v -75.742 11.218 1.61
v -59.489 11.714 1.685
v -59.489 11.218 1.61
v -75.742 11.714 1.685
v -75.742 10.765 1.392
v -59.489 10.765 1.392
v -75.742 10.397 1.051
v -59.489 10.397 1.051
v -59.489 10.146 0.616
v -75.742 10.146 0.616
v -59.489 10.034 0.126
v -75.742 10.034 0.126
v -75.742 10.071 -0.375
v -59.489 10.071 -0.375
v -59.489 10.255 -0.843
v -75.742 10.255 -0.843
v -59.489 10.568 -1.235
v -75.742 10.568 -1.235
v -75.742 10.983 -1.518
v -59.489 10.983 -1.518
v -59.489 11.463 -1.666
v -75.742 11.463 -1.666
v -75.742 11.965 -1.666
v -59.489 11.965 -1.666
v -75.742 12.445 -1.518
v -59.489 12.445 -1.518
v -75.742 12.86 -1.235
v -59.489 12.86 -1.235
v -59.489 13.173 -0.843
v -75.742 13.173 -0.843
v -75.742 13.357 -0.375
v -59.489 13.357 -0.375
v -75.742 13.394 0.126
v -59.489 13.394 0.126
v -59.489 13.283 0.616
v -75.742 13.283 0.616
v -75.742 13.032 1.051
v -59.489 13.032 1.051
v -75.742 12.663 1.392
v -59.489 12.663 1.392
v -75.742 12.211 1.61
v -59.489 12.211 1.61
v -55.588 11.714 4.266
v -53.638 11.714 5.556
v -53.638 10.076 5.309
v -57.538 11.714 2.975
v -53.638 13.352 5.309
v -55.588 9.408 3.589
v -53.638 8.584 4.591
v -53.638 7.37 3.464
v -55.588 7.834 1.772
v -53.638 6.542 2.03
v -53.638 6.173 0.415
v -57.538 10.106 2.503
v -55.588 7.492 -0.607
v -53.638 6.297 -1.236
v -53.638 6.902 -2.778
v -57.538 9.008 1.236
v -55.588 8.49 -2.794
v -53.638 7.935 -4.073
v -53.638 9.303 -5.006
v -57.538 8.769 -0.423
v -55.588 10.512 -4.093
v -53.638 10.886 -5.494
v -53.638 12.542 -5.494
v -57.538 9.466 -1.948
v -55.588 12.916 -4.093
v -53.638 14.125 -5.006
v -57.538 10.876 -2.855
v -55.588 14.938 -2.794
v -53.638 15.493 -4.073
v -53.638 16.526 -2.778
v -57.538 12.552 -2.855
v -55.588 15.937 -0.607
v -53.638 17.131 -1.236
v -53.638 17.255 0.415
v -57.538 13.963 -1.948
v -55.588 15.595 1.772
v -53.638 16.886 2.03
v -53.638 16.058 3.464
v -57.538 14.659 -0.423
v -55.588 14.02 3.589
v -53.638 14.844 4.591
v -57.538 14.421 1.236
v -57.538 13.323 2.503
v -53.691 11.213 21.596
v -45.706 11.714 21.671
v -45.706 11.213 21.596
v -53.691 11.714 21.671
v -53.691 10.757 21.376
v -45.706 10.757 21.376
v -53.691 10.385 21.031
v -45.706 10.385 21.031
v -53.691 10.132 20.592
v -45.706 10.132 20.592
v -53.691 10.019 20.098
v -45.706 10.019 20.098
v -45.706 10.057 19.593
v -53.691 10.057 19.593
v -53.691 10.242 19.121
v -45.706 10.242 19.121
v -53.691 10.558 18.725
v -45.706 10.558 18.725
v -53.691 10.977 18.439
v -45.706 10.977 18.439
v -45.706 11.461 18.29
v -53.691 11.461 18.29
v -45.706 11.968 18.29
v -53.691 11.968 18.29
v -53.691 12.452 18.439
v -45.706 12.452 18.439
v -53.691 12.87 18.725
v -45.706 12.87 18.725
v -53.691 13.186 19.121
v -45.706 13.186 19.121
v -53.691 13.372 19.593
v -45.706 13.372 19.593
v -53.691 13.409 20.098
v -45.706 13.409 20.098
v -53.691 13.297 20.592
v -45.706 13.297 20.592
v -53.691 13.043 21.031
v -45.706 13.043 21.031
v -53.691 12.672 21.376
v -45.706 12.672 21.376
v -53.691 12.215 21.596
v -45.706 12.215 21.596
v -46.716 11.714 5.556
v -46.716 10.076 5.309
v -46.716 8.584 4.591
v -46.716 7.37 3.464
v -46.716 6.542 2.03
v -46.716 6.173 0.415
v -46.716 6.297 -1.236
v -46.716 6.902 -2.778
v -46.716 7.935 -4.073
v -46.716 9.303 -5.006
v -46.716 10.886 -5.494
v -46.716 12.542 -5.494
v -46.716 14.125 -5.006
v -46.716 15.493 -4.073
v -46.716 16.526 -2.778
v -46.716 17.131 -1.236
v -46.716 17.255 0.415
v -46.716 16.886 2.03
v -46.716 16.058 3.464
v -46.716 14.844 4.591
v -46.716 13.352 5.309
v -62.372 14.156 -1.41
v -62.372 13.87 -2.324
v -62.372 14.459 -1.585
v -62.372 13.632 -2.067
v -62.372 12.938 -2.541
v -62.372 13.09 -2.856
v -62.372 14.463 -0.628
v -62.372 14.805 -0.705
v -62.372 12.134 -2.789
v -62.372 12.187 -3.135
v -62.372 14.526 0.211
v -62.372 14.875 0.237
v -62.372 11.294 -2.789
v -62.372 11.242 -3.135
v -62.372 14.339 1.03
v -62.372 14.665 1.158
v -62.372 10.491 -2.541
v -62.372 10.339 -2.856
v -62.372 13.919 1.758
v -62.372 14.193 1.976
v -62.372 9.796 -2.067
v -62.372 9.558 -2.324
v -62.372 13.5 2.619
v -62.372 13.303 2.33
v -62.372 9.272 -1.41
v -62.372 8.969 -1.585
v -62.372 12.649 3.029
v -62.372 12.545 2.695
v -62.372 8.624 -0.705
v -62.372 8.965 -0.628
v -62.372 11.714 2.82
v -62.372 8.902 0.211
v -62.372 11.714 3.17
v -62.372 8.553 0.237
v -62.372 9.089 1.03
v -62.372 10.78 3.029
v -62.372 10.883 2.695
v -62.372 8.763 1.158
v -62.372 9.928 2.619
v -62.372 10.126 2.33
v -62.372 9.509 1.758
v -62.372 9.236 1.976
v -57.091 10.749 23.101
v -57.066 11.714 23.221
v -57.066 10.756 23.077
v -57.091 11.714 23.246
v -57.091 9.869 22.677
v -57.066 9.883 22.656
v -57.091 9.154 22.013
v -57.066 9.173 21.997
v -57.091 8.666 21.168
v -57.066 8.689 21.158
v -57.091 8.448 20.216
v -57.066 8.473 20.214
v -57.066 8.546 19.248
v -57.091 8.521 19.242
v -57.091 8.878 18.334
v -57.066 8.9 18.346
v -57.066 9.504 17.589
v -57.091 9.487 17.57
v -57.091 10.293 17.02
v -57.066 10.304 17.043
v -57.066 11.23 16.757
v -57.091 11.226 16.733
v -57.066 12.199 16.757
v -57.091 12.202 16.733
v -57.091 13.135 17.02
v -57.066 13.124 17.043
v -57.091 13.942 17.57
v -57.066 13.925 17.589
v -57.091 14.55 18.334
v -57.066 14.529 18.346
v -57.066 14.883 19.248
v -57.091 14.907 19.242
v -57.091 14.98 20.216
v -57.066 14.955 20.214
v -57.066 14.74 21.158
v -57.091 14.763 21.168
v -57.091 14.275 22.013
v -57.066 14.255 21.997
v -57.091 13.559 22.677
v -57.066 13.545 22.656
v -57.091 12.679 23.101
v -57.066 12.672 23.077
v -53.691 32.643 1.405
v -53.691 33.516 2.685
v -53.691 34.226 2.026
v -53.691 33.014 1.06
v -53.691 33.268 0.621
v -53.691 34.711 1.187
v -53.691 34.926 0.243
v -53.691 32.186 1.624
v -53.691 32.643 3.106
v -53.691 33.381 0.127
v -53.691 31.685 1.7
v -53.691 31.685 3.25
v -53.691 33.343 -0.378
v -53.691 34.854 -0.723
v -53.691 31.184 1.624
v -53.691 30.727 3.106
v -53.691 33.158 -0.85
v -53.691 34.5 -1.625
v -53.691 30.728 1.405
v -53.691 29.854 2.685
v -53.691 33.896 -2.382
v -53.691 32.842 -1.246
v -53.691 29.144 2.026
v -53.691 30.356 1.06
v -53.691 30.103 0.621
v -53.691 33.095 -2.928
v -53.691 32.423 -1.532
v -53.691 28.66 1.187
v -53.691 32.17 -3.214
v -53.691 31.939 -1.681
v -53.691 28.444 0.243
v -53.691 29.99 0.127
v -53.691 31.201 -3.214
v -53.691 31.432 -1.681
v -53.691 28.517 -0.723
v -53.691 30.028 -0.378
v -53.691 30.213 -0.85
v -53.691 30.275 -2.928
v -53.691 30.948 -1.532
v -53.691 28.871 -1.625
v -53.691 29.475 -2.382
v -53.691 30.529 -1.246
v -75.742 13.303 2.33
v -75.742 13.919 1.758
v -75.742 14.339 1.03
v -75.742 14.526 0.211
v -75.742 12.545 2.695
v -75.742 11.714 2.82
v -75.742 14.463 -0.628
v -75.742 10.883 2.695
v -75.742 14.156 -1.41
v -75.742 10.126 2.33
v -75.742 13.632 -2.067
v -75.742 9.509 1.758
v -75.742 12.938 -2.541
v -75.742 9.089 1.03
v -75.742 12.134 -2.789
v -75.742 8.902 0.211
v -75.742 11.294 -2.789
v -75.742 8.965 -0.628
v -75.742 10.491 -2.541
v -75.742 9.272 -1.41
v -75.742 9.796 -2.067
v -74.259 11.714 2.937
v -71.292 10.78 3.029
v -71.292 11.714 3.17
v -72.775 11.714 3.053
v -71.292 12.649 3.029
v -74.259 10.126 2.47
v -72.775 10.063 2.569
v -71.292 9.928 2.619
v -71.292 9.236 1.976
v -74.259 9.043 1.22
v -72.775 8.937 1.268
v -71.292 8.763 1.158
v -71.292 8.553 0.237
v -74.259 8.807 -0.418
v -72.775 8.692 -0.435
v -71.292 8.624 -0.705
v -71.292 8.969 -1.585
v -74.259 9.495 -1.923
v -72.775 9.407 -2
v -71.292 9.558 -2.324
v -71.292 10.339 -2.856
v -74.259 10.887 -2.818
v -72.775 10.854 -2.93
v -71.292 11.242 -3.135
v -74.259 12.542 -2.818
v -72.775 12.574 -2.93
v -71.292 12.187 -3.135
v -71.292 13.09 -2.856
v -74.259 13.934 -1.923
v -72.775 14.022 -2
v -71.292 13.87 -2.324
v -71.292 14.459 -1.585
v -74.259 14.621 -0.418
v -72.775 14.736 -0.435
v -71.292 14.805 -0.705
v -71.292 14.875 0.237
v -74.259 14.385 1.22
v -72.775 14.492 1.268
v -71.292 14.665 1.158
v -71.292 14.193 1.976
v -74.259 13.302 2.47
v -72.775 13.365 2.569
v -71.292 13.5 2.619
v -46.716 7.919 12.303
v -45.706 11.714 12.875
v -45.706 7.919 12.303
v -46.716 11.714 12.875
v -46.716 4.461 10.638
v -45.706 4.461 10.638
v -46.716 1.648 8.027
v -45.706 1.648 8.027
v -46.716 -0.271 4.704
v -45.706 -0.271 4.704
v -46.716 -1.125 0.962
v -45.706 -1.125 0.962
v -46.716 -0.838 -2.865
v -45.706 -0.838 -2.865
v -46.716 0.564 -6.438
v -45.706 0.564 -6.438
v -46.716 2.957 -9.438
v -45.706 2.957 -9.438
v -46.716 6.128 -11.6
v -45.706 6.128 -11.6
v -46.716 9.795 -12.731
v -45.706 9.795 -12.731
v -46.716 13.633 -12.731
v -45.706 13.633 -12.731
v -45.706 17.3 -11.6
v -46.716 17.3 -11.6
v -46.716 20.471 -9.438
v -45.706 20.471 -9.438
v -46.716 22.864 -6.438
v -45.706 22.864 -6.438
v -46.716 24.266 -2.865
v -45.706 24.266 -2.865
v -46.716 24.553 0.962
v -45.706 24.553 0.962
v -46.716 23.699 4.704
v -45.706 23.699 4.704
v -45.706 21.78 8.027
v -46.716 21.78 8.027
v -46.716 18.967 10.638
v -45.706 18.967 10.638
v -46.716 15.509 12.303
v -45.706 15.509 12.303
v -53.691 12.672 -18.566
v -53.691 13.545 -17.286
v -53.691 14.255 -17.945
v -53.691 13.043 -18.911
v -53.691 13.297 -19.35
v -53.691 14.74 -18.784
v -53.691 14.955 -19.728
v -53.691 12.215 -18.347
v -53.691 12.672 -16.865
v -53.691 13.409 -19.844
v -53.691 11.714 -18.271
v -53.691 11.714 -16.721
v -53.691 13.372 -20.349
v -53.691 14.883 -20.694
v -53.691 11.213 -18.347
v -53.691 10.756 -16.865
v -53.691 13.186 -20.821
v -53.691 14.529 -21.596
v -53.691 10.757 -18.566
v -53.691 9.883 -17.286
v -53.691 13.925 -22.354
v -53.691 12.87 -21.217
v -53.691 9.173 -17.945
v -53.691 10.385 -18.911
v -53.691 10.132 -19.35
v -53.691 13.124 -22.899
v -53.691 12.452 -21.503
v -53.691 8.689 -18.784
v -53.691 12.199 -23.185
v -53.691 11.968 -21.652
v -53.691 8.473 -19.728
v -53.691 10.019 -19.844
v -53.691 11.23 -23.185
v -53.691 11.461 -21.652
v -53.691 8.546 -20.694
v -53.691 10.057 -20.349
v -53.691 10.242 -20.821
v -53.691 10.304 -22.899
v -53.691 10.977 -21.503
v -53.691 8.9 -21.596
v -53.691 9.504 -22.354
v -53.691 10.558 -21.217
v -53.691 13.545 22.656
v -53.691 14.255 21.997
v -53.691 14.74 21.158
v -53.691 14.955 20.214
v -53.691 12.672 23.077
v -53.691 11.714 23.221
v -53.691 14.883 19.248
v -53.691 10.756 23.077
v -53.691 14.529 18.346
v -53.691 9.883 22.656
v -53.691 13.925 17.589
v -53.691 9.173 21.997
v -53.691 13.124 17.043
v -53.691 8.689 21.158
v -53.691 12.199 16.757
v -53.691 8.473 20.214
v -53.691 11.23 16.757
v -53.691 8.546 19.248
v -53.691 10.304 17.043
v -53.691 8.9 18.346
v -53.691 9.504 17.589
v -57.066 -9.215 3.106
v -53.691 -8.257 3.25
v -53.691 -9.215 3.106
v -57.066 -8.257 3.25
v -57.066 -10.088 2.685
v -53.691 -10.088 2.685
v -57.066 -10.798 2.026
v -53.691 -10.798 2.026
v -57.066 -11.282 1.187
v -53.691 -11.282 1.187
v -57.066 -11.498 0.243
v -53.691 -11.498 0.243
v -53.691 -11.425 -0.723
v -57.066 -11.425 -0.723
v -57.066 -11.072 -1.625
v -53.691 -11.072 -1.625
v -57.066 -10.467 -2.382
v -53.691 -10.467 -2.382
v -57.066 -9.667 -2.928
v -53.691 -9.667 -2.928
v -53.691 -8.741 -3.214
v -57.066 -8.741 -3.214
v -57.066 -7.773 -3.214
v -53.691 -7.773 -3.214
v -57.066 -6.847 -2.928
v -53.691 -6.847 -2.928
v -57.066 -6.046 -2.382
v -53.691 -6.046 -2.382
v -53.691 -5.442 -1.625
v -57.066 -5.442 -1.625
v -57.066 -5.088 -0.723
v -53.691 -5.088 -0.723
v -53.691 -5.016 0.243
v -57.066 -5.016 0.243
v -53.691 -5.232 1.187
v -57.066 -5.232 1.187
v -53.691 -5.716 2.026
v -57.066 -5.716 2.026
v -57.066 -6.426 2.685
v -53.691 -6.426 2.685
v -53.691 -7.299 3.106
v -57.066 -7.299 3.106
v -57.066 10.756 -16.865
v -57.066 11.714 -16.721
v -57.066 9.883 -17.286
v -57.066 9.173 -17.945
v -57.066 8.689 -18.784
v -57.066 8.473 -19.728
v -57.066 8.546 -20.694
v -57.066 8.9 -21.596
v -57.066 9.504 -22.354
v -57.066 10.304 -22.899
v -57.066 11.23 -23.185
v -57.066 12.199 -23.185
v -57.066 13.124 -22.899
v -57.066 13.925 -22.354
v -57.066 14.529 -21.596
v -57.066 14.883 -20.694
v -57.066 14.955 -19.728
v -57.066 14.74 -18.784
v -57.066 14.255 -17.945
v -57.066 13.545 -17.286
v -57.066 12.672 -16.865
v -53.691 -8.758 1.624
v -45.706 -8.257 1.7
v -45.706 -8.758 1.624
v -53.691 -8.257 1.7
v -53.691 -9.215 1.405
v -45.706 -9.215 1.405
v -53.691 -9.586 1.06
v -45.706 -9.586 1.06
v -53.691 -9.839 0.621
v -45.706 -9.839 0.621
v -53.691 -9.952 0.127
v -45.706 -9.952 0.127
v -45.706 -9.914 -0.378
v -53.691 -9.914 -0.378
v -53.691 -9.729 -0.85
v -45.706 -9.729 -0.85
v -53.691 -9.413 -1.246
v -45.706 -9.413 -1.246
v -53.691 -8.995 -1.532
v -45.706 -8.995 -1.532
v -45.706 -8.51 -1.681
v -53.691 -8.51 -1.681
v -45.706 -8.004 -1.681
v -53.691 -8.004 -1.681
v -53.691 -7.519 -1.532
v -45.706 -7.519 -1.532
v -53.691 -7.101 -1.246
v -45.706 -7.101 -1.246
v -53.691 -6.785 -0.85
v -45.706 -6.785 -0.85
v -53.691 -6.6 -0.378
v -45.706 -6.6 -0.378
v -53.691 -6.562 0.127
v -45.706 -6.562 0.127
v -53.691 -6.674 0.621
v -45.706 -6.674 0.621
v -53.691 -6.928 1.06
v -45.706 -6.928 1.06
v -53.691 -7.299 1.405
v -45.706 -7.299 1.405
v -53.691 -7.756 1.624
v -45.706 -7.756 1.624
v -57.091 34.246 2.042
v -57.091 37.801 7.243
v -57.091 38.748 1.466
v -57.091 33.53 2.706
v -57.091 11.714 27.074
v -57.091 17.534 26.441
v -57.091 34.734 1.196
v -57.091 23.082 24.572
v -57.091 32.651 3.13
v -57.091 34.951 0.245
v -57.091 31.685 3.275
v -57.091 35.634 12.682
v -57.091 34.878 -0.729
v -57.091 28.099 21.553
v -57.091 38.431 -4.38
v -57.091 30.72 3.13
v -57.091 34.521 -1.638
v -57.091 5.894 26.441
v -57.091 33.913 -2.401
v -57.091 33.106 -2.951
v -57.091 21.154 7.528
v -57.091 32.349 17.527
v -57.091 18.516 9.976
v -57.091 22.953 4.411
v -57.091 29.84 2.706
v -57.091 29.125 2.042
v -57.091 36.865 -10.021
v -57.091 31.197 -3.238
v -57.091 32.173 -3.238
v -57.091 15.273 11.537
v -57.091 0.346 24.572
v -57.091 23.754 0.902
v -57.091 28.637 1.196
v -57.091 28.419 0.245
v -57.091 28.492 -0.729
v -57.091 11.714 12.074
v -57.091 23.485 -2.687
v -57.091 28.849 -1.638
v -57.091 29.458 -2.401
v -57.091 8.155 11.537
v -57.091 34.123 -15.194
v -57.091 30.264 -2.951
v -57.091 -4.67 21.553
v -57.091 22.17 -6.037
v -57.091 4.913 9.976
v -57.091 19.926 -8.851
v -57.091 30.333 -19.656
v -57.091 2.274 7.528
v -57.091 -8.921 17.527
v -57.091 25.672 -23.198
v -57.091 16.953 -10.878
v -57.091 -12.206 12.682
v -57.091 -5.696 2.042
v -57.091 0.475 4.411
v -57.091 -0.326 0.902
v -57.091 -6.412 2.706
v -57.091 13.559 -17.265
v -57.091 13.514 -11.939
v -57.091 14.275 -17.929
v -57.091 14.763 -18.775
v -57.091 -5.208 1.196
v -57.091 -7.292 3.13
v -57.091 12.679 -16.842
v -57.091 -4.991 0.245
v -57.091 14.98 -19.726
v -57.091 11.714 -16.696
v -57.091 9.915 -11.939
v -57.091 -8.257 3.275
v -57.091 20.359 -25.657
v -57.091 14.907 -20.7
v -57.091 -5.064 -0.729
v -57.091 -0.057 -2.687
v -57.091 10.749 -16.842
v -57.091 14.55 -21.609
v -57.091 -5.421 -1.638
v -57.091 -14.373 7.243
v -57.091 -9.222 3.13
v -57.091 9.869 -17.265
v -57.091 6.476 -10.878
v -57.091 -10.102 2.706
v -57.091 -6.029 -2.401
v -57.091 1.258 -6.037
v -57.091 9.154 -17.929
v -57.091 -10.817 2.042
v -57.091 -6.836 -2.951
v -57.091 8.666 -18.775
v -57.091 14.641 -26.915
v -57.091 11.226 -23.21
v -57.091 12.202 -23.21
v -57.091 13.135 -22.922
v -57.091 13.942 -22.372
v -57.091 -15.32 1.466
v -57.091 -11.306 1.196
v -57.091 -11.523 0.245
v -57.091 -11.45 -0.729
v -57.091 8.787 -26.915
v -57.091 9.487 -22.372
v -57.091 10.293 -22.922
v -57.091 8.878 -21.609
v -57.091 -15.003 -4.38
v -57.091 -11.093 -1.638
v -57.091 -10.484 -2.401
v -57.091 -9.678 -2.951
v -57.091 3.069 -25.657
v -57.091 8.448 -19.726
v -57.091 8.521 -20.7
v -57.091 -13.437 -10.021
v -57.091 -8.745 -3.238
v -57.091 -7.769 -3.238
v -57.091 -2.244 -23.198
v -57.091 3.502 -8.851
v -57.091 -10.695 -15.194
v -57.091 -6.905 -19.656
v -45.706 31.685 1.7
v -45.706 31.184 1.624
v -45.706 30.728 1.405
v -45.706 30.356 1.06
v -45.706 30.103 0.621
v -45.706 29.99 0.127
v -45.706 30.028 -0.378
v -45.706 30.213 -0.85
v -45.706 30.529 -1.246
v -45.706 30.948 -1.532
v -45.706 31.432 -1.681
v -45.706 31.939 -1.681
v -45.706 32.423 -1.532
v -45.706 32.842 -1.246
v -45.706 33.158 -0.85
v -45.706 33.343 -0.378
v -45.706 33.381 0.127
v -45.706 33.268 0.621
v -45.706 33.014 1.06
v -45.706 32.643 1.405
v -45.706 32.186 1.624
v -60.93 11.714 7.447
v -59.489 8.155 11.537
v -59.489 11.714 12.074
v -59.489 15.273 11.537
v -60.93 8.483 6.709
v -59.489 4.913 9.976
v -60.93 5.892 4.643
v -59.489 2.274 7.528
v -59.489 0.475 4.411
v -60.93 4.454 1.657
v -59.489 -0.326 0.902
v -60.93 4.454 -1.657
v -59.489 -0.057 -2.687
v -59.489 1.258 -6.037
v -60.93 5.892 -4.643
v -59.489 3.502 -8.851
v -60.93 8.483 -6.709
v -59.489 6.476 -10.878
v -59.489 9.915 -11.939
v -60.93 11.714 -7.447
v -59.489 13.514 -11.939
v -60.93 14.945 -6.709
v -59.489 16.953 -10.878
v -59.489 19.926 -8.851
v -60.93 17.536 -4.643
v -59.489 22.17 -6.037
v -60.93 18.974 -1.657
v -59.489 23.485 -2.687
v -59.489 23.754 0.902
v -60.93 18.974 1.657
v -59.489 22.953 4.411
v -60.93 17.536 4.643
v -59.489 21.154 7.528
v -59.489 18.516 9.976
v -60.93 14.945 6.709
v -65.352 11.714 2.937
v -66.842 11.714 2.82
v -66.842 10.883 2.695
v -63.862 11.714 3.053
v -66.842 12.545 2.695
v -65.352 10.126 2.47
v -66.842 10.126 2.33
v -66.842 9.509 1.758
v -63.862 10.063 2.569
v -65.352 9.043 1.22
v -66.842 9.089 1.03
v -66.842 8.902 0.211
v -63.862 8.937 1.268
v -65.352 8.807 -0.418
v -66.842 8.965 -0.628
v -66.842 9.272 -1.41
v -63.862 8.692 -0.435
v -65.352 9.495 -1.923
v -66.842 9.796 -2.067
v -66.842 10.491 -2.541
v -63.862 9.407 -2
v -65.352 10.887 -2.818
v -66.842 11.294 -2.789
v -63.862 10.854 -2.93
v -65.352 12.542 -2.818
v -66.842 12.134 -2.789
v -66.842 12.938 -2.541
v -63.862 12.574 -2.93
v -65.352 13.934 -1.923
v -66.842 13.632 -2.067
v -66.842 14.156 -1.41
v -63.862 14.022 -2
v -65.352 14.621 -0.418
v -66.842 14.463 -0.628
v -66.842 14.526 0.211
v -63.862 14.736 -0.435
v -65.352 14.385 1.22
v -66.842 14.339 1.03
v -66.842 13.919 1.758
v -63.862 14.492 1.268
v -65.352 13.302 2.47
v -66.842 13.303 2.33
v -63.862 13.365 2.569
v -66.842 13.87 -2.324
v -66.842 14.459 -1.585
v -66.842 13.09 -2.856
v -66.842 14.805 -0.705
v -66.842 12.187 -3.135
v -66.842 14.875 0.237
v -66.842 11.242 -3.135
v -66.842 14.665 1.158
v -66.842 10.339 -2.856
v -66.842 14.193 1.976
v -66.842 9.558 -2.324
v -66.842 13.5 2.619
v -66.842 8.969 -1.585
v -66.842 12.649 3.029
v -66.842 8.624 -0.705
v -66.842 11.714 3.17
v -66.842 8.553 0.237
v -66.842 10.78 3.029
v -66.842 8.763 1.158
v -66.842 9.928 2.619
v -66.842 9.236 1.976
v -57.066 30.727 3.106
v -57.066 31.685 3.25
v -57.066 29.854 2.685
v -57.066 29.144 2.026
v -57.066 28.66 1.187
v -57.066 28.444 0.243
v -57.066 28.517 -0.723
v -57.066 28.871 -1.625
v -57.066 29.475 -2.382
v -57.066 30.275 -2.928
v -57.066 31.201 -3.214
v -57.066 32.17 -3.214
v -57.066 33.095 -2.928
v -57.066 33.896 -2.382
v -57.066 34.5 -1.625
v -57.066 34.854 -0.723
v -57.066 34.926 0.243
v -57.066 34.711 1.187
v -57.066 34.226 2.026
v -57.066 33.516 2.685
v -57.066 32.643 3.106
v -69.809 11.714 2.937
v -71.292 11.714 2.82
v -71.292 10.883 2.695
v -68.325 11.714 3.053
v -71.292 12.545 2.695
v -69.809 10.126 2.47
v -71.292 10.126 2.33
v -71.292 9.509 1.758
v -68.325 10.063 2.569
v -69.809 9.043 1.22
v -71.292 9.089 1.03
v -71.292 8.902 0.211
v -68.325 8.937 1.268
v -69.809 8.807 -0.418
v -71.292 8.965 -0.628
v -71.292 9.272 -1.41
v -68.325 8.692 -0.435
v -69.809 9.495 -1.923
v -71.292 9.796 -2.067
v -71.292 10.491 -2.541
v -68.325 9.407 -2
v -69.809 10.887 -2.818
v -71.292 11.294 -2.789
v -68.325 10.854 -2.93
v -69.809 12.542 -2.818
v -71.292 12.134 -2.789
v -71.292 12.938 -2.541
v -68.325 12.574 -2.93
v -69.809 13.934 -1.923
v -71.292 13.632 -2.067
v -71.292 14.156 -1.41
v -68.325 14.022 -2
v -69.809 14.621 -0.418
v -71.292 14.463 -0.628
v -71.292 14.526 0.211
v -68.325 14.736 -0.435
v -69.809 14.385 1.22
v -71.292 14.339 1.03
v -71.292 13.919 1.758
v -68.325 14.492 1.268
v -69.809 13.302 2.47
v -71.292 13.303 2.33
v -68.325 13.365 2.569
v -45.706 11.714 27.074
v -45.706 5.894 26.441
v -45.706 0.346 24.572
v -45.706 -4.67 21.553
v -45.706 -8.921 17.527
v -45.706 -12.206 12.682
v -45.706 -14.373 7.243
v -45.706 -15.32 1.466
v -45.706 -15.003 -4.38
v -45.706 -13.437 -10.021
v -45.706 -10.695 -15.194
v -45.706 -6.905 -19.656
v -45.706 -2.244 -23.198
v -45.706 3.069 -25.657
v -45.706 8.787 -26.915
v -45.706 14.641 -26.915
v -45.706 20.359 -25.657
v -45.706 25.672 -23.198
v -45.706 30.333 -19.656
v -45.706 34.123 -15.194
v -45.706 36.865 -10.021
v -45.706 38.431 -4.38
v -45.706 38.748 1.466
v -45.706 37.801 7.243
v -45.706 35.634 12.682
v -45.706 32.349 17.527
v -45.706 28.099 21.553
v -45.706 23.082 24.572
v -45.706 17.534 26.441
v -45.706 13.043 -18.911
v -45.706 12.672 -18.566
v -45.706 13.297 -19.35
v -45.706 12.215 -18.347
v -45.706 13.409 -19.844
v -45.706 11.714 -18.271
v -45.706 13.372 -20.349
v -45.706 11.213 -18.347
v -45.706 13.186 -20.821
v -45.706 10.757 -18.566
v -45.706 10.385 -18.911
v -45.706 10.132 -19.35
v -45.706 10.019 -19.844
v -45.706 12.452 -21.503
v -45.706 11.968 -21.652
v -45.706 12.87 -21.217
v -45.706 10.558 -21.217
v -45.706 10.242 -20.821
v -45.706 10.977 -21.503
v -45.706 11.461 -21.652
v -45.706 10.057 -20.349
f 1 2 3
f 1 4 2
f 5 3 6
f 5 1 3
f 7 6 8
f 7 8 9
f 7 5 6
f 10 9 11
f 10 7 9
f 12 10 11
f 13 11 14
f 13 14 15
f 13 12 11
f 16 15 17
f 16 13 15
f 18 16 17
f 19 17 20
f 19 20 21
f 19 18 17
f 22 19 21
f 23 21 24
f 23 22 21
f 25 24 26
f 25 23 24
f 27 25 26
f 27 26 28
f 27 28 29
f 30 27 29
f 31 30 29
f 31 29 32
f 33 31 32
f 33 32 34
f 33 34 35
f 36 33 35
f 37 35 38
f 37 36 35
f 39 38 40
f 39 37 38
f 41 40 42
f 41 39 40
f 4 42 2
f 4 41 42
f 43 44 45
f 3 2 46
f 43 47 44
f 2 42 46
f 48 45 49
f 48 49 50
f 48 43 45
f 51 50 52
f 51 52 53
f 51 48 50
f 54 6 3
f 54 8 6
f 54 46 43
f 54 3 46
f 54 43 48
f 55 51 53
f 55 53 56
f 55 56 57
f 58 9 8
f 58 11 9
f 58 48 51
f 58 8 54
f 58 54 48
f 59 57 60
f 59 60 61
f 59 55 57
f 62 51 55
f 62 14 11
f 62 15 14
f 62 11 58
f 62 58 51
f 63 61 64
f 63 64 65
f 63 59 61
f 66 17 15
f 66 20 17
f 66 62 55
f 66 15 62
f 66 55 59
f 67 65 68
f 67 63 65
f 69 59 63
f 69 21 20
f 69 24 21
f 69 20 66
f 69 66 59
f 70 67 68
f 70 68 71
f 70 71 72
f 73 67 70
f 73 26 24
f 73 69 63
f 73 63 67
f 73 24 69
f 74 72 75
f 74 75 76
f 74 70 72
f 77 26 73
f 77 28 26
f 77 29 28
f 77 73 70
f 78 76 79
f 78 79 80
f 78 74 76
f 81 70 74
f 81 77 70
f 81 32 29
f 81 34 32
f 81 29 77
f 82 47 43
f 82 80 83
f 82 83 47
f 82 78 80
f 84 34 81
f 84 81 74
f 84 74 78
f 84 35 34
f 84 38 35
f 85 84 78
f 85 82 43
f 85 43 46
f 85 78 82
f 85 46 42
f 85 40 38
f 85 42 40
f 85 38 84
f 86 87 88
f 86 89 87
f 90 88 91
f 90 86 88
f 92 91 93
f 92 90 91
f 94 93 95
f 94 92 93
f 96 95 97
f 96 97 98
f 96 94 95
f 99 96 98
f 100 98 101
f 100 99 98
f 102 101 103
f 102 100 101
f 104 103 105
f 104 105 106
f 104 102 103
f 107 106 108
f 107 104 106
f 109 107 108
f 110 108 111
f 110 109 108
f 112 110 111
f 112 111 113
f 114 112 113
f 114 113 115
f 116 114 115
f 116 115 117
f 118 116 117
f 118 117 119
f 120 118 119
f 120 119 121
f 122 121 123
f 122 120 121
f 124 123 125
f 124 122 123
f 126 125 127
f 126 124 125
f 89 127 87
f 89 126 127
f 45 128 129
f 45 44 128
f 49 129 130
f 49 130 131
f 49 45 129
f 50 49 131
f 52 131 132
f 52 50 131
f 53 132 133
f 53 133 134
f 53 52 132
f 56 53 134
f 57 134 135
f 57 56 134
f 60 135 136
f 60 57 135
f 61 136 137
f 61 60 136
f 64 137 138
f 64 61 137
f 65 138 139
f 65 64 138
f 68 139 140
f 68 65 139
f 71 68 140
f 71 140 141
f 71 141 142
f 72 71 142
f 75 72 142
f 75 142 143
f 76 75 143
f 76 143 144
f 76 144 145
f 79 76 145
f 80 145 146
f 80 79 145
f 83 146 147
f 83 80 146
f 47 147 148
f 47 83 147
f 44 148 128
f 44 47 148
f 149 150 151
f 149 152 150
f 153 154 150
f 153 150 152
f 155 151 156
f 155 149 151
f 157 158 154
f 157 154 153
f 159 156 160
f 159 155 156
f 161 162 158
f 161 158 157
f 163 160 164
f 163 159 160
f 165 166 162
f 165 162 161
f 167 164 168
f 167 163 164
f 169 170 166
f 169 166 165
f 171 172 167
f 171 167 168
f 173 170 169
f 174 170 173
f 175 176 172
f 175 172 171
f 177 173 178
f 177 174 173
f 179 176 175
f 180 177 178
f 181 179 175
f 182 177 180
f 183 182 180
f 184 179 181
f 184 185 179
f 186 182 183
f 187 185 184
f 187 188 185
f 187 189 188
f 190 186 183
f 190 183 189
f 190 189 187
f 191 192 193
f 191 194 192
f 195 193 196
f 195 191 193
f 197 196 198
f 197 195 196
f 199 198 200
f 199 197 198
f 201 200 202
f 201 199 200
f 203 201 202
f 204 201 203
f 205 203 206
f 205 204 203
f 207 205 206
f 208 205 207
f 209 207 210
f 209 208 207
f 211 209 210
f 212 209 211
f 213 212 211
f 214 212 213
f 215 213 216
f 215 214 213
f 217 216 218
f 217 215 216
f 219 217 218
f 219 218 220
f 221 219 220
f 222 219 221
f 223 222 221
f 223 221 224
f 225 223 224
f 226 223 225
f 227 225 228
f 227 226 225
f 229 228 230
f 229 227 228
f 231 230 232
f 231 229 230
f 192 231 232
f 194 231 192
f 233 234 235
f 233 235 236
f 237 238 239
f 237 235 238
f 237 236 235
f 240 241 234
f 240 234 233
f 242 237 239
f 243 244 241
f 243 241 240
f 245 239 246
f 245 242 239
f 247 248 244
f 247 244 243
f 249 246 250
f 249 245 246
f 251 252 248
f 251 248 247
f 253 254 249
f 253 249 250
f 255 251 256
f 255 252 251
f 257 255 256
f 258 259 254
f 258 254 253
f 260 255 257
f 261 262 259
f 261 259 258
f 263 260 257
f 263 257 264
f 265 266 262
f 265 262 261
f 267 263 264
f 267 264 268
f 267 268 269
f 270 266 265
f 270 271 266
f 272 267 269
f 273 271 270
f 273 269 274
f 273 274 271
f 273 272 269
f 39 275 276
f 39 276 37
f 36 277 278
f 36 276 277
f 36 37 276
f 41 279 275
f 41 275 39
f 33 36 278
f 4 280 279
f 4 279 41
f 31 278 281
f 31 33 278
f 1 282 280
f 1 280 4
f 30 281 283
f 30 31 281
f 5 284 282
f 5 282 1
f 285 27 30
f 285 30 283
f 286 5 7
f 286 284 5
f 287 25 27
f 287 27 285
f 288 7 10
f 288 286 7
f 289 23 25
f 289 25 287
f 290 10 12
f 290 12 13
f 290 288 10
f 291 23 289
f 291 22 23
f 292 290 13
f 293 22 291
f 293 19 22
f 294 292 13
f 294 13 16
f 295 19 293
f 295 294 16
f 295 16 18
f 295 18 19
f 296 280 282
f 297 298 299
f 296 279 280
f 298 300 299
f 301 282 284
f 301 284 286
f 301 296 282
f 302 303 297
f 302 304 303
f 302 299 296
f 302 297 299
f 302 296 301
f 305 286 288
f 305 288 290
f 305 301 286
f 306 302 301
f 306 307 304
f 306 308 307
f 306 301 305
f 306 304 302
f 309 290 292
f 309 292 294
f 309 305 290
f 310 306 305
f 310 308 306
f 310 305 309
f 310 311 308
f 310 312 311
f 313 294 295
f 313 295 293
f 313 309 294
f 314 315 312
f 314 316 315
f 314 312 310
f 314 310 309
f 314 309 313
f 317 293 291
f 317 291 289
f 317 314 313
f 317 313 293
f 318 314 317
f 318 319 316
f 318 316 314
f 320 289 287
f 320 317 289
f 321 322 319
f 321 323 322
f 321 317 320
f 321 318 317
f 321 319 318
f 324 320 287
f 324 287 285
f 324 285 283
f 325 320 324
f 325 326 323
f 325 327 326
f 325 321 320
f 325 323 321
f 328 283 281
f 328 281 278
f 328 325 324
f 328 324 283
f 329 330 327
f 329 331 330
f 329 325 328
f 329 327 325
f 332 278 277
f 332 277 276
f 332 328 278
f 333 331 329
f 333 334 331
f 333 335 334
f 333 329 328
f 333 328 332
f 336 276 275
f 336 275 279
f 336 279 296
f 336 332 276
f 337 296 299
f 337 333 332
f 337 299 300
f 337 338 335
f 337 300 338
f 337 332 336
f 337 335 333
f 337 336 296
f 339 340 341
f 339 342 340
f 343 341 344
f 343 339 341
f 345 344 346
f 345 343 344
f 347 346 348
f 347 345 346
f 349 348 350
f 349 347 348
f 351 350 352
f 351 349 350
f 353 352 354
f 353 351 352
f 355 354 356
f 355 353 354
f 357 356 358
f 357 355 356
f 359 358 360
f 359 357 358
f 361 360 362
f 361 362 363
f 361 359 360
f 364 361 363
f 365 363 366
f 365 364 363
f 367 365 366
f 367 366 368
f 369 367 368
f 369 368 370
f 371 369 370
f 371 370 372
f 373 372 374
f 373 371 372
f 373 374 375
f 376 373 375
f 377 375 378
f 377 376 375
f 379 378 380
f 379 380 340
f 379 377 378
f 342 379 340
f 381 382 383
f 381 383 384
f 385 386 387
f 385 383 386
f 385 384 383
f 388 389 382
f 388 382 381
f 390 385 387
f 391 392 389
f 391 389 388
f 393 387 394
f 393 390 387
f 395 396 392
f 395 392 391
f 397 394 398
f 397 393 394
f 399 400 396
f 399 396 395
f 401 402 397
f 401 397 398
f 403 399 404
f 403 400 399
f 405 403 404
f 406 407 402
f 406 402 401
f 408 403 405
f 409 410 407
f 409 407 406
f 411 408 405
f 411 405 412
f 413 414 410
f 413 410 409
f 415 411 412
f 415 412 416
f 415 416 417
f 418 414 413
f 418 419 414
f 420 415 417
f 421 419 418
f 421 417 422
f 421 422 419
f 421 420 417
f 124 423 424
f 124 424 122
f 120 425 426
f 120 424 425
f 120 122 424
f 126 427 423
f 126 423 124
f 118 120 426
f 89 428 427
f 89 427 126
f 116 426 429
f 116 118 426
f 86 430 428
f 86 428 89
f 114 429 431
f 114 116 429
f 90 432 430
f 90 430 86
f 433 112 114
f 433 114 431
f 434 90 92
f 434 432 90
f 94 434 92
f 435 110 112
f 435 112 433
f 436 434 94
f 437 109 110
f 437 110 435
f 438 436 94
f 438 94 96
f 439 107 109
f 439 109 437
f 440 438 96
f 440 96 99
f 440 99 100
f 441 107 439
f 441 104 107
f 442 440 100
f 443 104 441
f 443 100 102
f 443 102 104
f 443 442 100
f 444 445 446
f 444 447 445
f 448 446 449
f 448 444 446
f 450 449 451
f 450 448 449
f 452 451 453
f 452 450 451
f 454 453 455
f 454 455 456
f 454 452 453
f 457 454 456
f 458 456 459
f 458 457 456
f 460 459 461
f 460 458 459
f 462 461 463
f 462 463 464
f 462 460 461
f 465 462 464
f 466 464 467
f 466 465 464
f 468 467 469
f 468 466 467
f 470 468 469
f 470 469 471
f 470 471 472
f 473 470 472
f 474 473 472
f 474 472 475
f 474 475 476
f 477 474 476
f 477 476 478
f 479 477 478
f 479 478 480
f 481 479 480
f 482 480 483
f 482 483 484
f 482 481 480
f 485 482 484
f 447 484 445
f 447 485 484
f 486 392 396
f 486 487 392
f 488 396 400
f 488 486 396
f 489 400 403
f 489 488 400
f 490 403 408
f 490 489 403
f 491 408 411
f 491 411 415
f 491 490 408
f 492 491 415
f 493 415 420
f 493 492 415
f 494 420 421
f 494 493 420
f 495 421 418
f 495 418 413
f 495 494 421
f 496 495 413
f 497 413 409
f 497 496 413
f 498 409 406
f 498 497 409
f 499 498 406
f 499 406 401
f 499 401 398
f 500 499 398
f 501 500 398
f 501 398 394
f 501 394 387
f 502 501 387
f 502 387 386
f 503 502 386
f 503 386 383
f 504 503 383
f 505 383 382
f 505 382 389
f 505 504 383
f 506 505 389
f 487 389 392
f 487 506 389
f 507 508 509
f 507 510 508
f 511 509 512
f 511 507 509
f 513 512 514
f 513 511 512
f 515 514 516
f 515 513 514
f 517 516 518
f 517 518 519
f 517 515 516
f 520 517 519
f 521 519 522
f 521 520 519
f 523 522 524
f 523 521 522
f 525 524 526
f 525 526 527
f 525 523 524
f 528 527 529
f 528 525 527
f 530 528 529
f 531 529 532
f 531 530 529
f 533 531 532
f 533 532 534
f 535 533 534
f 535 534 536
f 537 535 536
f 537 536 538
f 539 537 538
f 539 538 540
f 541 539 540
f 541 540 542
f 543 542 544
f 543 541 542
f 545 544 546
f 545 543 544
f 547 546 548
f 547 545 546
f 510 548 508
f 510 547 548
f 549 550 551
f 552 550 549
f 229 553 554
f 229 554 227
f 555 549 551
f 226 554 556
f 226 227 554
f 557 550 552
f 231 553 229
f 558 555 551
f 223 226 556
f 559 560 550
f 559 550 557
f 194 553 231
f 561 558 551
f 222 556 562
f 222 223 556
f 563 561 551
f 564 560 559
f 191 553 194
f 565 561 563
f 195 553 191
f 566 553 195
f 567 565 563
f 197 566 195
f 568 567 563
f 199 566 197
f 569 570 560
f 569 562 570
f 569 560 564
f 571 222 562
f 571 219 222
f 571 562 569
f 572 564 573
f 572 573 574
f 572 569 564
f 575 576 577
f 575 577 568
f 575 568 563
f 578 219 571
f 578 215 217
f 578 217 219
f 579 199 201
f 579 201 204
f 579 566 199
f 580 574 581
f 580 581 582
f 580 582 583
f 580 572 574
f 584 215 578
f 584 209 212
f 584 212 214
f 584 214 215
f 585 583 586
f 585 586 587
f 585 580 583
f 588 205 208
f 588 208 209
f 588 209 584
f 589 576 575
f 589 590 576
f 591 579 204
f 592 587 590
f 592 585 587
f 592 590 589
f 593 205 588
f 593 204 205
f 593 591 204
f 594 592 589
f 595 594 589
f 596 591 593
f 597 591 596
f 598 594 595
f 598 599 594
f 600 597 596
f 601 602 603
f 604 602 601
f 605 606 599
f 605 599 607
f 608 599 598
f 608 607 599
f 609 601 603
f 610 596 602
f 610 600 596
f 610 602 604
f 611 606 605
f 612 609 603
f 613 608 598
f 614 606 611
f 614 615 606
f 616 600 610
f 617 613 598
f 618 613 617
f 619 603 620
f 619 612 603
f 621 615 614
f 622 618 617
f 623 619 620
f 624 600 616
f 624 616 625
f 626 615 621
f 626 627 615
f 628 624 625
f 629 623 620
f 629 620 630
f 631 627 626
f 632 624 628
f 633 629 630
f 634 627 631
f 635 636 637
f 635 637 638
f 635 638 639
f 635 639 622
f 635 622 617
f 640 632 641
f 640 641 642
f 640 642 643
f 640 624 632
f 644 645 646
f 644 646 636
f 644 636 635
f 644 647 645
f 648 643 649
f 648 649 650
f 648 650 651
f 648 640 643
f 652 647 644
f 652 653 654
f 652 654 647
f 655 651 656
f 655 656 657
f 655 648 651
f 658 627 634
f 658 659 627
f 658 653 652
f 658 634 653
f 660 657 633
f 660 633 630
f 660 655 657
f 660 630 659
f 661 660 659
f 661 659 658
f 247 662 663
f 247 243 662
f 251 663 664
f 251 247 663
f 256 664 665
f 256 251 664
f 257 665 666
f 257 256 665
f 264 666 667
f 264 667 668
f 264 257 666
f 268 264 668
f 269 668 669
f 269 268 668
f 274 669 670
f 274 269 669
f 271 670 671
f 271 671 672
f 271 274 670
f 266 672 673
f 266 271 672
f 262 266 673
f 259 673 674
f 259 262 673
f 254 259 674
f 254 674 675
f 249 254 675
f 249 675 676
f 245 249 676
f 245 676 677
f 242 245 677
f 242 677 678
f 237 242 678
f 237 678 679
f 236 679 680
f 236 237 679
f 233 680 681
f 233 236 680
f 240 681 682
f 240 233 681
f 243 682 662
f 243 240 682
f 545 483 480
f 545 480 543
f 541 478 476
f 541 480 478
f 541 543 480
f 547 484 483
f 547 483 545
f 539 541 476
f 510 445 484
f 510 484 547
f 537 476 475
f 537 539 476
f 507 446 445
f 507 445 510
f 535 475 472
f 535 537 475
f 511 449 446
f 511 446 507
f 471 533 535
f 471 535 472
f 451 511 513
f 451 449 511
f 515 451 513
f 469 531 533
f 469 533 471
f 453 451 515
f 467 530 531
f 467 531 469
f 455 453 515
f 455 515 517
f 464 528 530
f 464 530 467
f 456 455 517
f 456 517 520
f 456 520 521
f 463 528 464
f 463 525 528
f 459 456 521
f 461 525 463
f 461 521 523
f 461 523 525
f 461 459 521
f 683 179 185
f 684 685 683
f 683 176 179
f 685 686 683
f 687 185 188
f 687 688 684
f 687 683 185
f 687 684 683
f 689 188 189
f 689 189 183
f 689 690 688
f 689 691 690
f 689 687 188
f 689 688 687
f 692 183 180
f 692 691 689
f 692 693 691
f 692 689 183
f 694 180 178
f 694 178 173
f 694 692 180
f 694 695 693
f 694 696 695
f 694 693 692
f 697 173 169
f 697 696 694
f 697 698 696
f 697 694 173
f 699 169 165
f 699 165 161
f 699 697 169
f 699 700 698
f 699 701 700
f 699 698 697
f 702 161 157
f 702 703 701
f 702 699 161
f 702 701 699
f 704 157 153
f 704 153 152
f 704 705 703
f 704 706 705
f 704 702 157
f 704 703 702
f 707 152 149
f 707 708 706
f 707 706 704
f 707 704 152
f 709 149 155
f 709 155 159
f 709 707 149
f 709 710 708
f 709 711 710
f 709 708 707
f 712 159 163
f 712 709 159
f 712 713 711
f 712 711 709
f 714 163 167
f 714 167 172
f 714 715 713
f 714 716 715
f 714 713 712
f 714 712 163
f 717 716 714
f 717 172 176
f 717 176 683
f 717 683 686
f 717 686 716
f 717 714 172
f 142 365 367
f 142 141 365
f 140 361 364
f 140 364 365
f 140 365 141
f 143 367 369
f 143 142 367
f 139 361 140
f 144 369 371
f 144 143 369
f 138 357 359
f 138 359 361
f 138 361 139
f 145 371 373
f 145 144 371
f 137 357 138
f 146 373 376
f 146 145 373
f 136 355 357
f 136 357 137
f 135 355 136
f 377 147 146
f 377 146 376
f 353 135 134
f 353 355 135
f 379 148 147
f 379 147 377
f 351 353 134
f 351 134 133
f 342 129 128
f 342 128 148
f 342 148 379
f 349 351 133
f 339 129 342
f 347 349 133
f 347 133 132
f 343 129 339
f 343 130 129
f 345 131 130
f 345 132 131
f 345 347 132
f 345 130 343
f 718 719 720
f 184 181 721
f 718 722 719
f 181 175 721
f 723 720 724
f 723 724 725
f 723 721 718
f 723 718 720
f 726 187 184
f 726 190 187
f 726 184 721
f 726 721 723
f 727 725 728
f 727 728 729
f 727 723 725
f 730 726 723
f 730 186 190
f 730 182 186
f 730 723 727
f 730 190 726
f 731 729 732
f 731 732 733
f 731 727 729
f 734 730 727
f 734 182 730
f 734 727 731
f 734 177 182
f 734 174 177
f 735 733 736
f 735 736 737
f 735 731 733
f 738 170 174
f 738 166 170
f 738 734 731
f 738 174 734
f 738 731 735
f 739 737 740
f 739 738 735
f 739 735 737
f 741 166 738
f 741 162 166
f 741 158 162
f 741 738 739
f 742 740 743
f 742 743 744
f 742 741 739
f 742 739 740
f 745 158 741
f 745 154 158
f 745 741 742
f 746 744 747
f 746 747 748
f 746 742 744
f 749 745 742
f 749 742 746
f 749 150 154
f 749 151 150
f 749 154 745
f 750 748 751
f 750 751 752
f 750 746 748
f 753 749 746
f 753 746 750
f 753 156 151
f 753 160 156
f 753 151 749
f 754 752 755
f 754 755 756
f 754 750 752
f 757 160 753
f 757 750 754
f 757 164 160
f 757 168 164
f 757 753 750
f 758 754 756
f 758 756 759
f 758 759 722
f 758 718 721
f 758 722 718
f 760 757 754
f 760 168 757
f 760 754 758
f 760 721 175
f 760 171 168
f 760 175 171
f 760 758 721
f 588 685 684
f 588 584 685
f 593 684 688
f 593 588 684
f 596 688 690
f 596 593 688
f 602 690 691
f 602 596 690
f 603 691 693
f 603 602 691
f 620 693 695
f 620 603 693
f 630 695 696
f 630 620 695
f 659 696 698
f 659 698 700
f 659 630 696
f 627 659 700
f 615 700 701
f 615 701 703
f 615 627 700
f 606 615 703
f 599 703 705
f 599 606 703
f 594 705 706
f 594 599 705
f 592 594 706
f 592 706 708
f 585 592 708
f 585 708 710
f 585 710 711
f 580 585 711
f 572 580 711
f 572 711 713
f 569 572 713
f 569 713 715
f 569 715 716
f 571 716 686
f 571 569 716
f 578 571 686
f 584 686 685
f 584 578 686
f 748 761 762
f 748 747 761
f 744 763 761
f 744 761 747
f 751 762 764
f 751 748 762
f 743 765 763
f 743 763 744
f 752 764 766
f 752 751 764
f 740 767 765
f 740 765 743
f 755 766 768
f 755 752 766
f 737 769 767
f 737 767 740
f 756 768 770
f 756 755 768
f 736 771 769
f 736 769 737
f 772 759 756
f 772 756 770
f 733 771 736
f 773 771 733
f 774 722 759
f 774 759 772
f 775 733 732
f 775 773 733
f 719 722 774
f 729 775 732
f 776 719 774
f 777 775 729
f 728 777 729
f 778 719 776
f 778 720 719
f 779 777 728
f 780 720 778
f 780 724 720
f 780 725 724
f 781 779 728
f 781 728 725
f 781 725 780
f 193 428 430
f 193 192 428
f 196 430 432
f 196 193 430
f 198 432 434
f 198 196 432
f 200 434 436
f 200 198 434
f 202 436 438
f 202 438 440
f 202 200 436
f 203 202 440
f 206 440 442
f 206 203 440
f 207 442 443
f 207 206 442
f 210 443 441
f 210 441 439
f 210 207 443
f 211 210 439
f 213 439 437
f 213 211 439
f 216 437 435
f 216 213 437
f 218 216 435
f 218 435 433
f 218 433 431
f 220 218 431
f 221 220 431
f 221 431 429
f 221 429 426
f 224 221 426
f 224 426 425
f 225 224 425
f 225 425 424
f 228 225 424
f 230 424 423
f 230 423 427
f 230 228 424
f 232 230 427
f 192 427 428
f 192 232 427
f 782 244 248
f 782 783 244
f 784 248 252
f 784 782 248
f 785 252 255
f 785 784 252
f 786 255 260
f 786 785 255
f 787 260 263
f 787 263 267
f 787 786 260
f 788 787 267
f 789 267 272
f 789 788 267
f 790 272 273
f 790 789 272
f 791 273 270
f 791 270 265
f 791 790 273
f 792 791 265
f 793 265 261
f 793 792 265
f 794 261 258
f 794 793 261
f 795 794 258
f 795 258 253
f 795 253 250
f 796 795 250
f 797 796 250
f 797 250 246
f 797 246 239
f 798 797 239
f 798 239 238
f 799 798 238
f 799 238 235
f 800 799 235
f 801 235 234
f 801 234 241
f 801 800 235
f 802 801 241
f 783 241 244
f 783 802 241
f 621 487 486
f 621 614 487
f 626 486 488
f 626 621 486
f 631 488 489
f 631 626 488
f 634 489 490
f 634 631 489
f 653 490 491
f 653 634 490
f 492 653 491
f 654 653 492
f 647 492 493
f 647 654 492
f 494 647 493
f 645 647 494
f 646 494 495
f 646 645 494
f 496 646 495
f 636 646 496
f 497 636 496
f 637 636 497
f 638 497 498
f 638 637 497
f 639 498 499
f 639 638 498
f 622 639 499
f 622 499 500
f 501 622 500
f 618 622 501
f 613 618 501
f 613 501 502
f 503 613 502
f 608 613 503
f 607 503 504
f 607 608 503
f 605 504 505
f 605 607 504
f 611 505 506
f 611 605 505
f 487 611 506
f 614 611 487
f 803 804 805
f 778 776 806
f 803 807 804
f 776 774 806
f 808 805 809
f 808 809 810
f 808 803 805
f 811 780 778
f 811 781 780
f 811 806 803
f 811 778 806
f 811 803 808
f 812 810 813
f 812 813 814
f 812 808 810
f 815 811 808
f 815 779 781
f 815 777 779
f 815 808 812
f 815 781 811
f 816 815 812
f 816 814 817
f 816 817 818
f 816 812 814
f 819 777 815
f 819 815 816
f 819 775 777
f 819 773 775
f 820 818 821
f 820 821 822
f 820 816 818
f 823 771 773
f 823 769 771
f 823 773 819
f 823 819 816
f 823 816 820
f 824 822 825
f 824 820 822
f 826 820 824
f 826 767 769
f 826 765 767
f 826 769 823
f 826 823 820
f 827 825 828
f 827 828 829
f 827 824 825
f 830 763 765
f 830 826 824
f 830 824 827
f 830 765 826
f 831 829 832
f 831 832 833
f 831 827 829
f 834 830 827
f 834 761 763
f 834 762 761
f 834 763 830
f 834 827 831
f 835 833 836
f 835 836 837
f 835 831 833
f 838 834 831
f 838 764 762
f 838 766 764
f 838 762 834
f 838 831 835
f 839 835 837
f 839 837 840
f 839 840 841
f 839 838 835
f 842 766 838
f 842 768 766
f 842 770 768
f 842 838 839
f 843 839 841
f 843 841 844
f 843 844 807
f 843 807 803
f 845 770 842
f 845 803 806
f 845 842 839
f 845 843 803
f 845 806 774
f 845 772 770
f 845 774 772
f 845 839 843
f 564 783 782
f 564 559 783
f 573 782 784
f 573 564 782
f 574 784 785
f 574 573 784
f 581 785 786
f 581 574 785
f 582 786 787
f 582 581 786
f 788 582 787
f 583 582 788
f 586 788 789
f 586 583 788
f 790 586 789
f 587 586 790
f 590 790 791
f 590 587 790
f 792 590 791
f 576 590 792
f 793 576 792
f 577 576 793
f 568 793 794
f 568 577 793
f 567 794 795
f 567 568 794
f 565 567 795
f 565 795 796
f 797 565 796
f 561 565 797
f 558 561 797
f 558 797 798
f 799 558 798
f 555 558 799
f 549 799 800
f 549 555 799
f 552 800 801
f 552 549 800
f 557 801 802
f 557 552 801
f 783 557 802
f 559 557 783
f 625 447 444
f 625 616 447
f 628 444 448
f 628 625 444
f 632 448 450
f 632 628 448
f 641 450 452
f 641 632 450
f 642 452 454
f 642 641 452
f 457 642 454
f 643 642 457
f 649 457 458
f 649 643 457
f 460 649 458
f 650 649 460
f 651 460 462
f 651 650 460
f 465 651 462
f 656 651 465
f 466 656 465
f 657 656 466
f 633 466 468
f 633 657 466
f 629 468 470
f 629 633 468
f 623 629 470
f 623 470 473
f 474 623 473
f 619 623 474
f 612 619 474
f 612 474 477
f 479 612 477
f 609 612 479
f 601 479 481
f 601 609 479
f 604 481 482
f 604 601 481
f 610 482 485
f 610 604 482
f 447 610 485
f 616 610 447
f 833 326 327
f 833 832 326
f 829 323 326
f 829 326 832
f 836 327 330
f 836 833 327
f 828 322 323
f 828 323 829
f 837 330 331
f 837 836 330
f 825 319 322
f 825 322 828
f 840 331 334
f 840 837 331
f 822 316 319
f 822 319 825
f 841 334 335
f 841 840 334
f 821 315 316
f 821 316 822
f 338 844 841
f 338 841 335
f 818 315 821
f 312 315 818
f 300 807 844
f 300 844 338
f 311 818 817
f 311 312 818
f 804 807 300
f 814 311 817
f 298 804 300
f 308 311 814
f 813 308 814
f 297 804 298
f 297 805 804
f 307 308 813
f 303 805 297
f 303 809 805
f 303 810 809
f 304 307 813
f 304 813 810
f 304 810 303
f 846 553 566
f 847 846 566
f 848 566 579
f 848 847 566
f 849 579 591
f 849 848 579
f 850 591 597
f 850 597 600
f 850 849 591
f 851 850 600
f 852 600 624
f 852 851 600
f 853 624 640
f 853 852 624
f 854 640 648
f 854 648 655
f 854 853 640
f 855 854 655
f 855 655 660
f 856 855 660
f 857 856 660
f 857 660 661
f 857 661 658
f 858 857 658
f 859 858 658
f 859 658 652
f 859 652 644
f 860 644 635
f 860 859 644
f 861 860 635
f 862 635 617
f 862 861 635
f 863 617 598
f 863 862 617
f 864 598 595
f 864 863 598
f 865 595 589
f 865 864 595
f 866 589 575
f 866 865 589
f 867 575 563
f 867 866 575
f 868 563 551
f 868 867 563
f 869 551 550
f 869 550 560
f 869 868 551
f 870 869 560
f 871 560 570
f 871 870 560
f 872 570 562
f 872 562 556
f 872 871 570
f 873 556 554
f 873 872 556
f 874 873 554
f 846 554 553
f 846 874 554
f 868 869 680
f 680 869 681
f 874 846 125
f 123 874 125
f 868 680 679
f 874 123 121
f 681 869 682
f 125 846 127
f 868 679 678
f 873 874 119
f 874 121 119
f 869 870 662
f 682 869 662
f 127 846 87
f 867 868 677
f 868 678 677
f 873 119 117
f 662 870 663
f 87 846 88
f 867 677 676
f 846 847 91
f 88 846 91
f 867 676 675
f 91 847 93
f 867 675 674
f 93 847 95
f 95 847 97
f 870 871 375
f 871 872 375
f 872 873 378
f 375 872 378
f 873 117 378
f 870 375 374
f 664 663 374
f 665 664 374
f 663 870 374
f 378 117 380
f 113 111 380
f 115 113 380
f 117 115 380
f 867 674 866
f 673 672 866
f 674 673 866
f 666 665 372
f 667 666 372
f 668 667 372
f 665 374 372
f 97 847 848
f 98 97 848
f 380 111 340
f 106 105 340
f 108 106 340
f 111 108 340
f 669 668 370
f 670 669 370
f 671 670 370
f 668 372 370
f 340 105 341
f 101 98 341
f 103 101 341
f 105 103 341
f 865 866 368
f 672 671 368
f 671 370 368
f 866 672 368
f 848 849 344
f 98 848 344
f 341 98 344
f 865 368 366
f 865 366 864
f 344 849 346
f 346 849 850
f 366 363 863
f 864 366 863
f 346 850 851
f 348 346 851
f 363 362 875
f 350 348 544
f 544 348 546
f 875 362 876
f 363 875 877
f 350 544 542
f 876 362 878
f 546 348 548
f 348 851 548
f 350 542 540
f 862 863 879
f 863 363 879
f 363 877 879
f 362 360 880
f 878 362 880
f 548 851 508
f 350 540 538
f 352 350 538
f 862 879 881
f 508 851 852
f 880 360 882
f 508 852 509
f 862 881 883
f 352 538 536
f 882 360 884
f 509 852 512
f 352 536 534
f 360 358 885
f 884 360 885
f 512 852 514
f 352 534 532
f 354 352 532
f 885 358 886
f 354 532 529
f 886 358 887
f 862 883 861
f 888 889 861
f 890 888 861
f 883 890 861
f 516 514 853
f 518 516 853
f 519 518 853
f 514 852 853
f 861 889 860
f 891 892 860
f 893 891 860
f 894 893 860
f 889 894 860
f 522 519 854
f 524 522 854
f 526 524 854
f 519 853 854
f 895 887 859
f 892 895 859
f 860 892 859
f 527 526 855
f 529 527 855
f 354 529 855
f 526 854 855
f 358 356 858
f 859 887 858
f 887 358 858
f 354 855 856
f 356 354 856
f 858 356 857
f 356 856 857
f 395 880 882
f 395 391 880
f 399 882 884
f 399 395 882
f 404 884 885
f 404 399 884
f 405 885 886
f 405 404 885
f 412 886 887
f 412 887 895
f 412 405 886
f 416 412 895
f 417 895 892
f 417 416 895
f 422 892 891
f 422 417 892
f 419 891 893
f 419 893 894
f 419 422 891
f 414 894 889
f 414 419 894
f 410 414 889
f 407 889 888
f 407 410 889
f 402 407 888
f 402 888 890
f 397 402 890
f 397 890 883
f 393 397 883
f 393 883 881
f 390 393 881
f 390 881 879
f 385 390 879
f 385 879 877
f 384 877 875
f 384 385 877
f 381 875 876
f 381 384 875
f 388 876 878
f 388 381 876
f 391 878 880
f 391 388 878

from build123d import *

# Parameters (mm, degrees)
CBORE_FOR_M3_HEX_SOCKET_HEAD_CAP_SCR_2_COUNT = 2
CBORE_FOR_M3_HEX_SOCKET_HEAD_CAP_SCR_2_PITCH = 28.243387552
CBORE_FOR_M3_HEX_SOCKET_HEAD_CAP_SCR_3_COUNT = 2
CBORE_FOR_M3_HEX_SOCKET_HEAD_CAP_SCR_3_PITCH = 39.942181723
CBORE_FOR_M3_HEX_SOCKET_HEAD_CAP_SCR_4_COUNT = 2
CBORE_FOR_M3_HEX_SOCKET_HEAD_CAP_SCR_4_PITCH = 28.243387552


with BuildPart() as part:
    # Sketch1 → Revolve17 (revolve)
    with BuildSketch(Plane.XY, mode=Mode.PRIVATE) as revolve17_sk:
        Polygon((-71.291859268, 14.884170222), (-71.291859268, 14.534170222), (-66.841859268, 14.884170222), (-66.841859268, 14.534170222), (-62.371609448, 14.884170222), (-62.371609448, 14.534170222), (-59.488918076, 23.788045652), (-57.091214807, 23.788045652), (-57.091214807, 38.788045652), (-45.705811648, 38.788045652), (-45.705811648, 26.202485582), (-45.705811648, 24.589170222), (-46.715811648, 24.589170222), (-46.715811648, 17.270420222), (-53.637545484, 17.270420222), (-59.488918076, 13.399170222), (-75.741859268, 13.399170222), (-75.741859268, 14.534170222), align=None)
    revolve(revolve17_sk.sketch.rotate(Axis((-795.163849313, 11.714170222, 0), (1, 0, 0)), 90), axis=Axis((-795.163849313, 11.714170222, 0), (1, 0, 0)))

    # Sketch4 → CBORE for M3 Hex Socket Head Cap Screw1 (revolve, cut)
    with BuildSketch(Plane(origin=(-57.091214807, 11.714170222, -19.971090862), x_dir=(0, 0, 1), z_dir=(0, 1, 0))):
        Polygon((0, 0), (0, 11.385403159), (1.7, 11.385403159), (1.7, 3.4), (3.25, 3.4), (3.25, 0.025), (3.275, 0), align=None)
    cbore_for_m3_hex_socket_head_cap_screw1 = revolve(axis=Axis((-63.441214807, 11.714170222, -19.971090862), (1, 0, 0)), mode=Mode.SUBTRACT)

    # CBORE for M3 Hex Socket Head Cap Scr 2: CBORE for M3 Hex Socket Head Cap Screw1 ×2
    with Locations(*[Vector(0, 0.7071067811865475, 0.7071067811865476) * (i * CBORE_FOR_M3_HEX_SOCKET_HEAD_CAP_SCR_2_PITCH) for i in range(1, CBORE_FOR_M3_HEX_SOCKET_HEAD_CAP_SCR_2_COUNT)]):
        add(cbore_for_m3_hex_socket_head_cap_screw1, mode=Mode.SUBTRACT)

    # CBORE for M3 Hex Socket Head Cap Scr 3: CBORE for M3 Hex Socket Head Cap Screw1 ×2
    with Locations(*[(0, 0, i * CBORE_FOR_M3_HEX_SOCKET_HEAD_CAP_SCR_3_PITCH) for i in range(1, CBORE_FOR_M3_HEX_SOCKET_HEAD_CAP_SCR_3_COUNT)]):
        add(cbore_for_m3_hex_socket_head_cap_screw1, mode=Mode.SUBTRACT)

    # CBORE for M3 Hex Socket Head Cap Scr 4: CBORE for M3 Hex Socket Head Cap Screw1 ×2
    with Locations(*[Vector(0, -0.7071067811865476, 0.7071067811865475) * (i * CBORE_FOR_M3_HEX_SOCKET_HEAD_CAP_SCR_4_PITCH) for i in range(1, CBORE_FOR_M3_HEX_SOCKET_HEAD_CAP_SCR_4_COUNT)]):
        add(cbore_for_m3_hex_socket_head_cap_screw1, mode=Mode.SUBTRACT)


solid = part.part
